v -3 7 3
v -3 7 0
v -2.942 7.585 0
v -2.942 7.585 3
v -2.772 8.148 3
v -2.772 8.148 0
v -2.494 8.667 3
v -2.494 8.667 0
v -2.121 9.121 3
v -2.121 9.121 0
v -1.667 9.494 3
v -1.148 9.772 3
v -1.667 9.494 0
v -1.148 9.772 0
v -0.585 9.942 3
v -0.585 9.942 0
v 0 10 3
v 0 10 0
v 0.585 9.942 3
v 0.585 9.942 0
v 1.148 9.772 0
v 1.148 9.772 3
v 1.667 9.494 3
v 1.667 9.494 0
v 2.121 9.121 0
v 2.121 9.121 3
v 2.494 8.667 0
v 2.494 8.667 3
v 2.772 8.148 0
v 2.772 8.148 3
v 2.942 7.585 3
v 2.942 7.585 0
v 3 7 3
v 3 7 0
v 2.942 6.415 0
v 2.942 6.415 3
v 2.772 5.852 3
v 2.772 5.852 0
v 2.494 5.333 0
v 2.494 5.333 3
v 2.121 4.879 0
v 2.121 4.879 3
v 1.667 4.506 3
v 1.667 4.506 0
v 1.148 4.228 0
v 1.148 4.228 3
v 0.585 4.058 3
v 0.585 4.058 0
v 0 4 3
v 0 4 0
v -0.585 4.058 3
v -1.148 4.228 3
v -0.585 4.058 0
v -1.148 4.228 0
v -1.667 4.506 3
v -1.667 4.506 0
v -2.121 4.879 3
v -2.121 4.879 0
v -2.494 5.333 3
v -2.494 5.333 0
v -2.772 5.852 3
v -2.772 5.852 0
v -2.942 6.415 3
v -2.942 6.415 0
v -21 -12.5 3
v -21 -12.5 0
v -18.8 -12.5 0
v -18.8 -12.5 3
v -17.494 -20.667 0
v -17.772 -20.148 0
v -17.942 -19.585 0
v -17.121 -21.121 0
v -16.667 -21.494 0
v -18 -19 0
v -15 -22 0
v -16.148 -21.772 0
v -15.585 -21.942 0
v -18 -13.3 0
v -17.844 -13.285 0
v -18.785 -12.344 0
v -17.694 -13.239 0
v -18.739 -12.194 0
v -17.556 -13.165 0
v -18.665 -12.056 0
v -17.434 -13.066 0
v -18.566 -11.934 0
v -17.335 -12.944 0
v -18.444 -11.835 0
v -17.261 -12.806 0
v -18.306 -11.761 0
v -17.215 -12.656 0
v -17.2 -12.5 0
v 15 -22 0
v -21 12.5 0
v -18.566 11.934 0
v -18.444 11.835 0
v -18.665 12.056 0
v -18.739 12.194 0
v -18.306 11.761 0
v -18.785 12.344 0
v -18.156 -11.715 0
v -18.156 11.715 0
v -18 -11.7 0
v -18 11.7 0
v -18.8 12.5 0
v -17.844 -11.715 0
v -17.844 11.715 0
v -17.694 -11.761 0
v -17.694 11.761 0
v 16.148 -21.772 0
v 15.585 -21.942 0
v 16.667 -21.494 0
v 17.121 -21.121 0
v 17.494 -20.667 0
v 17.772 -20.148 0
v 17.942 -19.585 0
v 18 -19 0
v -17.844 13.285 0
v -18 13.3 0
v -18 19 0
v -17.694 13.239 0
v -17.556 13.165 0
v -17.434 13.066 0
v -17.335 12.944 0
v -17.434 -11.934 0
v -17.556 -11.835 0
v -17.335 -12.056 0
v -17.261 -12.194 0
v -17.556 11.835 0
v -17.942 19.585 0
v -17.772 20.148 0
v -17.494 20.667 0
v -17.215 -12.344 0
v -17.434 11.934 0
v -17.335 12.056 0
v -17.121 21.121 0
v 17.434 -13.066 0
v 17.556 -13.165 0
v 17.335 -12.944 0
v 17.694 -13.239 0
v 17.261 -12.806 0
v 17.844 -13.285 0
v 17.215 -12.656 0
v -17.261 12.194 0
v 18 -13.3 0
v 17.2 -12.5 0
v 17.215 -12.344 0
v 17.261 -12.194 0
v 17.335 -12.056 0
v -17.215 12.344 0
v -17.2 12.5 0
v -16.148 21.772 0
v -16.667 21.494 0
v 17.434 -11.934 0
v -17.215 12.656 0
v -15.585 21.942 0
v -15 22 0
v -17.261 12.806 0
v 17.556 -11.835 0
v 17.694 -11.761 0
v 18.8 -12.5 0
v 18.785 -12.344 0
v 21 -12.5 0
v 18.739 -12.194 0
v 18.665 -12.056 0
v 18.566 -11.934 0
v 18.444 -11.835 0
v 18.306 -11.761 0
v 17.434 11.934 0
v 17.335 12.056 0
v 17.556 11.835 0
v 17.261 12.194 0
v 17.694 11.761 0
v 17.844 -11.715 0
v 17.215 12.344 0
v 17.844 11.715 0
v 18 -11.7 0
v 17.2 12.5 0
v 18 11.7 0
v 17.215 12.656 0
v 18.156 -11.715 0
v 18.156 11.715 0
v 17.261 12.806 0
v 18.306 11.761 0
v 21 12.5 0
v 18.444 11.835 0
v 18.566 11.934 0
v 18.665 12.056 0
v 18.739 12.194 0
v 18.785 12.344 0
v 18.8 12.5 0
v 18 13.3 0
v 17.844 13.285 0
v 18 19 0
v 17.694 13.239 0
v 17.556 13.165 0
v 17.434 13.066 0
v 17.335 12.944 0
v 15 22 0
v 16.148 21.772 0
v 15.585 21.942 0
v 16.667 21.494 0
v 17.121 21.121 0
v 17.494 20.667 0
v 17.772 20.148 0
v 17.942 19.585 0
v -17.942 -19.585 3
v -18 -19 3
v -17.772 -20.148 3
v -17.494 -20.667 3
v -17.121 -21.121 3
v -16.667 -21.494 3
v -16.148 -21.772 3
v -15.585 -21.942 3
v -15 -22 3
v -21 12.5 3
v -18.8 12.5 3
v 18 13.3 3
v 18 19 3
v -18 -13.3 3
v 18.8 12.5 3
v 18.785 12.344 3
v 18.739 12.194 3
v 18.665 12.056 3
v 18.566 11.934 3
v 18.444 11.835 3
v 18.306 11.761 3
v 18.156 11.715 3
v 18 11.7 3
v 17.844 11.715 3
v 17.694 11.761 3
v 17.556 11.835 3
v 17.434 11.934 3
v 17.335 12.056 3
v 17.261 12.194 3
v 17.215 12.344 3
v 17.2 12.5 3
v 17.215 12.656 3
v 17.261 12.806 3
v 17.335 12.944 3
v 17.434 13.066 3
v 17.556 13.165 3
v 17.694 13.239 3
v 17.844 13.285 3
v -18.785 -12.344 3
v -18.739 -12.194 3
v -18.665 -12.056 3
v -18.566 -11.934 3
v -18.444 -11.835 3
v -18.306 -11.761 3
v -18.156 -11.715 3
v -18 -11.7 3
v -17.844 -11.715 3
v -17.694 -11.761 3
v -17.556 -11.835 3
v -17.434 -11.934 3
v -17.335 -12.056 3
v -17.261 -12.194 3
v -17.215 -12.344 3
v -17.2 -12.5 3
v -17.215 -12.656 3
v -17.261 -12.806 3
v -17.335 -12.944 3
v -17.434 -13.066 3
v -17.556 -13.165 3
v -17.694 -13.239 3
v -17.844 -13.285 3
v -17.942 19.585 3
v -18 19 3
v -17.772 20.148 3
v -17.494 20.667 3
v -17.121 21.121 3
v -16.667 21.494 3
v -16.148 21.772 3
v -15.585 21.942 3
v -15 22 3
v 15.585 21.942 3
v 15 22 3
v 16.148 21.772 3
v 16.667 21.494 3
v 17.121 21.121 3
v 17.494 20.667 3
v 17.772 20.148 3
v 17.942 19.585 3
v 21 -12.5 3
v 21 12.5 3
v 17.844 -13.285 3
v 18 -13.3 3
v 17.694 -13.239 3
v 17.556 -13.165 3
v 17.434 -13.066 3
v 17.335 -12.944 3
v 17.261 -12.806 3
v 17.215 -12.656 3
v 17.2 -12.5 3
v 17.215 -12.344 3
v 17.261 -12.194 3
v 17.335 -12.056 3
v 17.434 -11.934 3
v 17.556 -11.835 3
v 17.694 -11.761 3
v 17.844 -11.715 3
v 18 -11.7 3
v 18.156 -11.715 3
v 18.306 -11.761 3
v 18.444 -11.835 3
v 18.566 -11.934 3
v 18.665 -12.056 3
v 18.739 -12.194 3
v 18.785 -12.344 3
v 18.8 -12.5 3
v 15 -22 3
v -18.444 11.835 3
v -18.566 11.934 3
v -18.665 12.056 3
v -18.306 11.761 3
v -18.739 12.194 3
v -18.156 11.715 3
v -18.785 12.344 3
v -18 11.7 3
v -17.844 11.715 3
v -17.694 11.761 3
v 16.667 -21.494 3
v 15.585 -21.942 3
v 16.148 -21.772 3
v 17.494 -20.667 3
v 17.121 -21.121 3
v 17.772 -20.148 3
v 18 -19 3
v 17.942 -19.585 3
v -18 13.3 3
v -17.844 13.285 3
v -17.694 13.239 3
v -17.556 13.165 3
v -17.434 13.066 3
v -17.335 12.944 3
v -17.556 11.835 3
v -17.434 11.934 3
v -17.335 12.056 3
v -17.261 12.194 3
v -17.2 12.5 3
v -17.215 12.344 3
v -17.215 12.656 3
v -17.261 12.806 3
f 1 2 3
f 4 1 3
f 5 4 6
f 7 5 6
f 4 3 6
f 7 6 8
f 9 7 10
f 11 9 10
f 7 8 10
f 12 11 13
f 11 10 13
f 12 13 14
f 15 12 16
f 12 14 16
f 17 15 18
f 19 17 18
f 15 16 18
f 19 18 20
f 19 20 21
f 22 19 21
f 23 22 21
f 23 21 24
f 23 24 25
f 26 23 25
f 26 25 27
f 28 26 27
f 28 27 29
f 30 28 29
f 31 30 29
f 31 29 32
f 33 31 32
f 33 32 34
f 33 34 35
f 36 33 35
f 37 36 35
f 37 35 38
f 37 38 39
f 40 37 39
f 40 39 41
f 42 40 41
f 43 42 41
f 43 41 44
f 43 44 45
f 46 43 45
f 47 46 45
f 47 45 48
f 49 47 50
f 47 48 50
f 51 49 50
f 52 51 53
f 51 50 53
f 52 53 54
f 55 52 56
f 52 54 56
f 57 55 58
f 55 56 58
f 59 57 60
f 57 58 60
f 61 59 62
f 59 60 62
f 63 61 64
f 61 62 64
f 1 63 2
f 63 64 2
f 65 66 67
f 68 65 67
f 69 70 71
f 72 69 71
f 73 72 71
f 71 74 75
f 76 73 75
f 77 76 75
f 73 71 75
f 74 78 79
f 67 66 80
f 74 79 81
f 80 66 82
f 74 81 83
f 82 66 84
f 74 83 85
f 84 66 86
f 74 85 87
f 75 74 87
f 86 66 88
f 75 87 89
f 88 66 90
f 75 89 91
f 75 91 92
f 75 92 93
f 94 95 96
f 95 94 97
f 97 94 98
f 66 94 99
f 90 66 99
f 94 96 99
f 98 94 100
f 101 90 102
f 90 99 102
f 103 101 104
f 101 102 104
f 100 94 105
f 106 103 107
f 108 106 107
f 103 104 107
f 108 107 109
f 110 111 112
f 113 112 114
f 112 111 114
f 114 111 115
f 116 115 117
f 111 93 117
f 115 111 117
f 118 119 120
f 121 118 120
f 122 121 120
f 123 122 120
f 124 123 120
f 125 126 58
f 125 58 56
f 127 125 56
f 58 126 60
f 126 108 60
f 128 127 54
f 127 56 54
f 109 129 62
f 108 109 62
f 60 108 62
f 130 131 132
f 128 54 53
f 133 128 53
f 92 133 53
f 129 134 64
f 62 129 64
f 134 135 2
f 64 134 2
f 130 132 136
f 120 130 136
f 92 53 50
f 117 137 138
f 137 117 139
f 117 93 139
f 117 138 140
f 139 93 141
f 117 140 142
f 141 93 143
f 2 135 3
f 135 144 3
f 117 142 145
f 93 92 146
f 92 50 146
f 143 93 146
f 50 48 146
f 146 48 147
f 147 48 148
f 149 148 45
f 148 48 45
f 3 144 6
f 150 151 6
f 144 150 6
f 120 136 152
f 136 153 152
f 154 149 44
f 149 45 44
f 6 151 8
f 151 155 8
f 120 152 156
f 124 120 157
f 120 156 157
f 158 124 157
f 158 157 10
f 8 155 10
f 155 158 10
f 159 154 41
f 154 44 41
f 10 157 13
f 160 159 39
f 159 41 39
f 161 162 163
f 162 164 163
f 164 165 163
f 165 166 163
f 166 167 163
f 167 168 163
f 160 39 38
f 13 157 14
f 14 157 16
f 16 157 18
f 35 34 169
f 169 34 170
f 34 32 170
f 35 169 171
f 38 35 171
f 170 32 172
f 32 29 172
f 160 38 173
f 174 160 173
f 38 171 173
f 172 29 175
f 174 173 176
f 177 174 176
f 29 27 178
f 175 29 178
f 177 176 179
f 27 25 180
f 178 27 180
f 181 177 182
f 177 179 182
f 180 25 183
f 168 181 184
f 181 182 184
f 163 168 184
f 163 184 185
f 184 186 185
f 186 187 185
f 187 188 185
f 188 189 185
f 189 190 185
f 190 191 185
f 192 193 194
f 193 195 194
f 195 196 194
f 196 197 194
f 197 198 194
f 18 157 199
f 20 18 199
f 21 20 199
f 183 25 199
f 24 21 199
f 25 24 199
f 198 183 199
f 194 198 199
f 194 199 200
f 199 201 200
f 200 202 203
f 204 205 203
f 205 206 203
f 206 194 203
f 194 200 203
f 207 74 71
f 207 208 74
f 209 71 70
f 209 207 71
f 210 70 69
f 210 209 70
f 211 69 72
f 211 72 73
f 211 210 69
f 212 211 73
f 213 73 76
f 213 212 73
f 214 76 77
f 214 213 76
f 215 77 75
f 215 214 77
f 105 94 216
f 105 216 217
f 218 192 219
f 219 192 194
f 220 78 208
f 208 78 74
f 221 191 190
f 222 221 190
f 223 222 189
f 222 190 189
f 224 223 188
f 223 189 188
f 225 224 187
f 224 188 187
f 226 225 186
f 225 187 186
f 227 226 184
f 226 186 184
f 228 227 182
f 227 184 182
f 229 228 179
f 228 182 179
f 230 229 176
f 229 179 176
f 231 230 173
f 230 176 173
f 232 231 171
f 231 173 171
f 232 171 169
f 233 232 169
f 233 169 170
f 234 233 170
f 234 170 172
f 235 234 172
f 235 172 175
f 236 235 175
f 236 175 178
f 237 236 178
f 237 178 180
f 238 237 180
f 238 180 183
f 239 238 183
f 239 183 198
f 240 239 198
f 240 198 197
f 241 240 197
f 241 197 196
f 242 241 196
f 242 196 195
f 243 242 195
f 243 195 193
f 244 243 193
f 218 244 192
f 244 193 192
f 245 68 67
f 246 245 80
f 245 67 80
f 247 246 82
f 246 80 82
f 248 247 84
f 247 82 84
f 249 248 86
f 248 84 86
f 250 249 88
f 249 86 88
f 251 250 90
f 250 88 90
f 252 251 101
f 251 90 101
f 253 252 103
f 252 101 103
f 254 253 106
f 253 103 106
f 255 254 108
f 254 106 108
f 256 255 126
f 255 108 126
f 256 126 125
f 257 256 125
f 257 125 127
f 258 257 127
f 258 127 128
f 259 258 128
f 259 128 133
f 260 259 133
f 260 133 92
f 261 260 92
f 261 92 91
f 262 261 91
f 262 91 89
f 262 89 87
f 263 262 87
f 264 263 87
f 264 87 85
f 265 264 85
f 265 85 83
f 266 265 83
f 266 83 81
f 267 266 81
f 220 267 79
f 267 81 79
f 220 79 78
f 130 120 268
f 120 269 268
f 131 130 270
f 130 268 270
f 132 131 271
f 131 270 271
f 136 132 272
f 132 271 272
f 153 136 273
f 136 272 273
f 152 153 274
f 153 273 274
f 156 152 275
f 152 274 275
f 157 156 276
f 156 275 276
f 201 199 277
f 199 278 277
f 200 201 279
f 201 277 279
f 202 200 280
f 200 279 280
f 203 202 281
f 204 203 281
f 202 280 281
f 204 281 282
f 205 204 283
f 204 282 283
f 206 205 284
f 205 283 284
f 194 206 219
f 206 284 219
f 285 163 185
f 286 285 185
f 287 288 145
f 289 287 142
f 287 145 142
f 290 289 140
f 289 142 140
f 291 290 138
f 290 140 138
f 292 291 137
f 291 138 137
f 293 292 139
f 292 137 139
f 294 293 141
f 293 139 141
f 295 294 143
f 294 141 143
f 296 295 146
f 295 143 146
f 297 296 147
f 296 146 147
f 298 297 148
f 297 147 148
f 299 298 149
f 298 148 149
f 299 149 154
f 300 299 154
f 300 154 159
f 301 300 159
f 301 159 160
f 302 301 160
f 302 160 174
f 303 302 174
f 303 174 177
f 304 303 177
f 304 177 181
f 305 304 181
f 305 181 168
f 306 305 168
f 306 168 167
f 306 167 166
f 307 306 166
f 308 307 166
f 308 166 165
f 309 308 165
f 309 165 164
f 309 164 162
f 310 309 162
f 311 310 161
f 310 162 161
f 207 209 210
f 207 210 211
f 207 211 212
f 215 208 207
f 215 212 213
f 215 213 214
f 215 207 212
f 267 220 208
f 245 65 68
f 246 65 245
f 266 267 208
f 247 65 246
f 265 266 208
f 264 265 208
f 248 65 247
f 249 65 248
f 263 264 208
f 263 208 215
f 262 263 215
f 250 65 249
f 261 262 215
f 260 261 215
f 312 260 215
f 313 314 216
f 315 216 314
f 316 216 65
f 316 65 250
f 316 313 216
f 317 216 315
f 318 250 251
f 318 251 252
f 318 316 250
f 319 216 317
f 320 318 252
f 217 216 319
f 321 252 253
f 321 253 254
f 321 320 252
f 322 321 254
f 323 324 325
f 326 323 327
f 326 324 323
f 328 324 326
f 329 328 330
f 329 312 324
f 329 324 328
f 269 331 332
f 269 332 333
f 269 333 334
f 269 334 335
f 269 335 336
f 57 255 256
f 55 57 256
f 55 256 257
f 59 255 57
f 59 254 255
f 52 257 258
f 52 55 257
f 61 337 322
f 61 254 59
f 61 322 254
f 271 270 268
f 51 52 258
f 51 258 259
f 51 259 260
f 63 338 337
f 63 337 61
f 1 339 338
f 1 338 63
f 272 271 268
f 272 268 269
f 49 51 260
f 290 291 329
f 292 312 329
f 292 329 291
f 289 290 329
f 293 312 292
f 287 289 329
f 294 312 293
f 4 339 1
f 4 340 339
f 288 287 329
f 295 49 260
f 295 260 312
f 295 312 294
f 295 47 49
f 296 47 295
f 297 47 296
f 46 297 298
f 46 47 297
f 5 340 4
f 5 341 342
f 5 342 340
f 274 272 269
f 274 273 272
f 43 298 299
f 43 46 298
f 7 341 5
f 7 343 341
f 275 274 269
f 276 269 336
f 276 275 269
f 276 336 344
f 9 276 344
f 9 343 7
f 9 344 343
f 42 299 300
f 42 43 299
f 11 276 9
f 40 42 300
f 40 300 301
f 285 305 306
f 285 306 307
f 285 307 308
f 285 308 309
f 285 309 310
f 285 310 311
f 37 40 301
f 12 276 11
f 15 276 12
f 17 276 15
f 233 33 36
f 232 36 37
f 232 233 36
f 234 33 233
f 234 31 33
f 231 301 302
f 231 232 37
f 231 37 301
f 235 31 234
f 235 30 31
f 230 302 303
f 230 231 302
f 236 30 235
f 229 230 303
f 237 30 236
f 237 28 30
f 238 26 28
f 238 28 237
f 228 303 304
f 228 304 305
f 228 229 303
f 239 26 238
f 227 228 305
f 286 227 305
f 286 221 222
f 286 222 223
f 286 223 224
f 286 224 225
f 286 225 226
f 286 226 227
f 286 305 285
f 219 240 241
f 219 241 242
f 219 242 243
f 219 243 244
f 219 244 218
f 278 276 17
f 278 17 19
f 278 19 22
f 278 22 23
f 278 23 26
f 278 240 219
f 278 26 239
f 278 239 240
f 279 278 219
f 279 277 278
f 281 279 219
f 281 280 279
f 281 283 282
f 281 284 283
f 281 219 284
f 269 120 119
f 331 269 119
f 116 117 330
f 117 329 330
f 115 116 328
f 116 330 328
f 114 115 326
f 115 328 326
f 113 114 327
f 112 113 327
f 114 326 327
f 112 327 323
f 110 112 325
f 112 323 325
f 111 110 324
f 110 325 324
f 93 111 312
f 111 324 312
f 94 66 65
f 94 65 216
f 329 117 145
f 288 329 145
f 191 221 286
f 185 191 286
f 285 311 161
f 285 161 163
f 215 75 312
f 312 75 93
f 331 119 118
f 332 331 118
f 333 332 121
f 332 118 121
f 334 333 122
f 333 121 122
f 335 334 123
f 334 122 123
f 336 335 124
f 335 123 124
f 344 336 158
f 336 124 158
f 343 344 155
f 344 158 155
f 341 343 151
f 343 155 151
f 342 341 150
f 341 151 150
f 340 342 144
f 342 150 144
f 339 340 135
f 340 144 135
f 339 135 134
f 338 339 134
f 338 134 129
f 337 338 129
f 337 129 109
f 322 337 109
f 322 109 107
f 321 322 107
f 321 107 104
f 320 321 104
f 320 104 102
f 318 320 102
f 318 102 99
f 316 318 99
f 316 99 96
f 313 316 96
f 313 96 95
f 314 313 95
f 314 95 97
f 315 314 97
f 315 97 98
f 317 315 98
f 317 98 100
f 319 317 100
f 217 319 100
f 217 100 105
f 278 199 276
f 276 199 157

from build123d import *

# Parameters (mm, degrees)
SKETCH1_W           = 3
SKETCH1_H           = 25
BOSS_EXTRUDE1_DEPTH = 3
SKETCH5_R           = 3
CUT_EXTRUDE3_DEPTH  = 31.56141358
SKETCH6_R           = 0.8
CUT_EXTRUDE4_DEPTH  = 31.56141358
FILLET1_R           = 3


with BuildPart() as part:
    # Sketch1 → Boss-Extrude1 (new body)
    with BuildSketch(Plane.XY):
        Polygon((-18, -12.5), (-18, -22), (18, -22), (18, -12.5), (15, -12.5), (15, 12.5), (18, 12.5), (18, 22), (-18, 22), (-18, 12.5), (-15, 12.5), (-15, -12.5), align=None)
        with Locations((-19.5, 0)):
            Rectangle(SKETCH1_W, SKETCH1_H)
        with Locations((-16.5, 0)):
            Rectangle(SKETCH1_W, SKETCH1_H)
        with Locations((19.5, 0)):
            Rectangle(SKETCH1_W, SKETCH1_H)
        with Locations((16.5, 0)):
            Rectangle(SKETCH1_W, SKETCH1_H)
    extrude(amount=BOSS_EXTRUDE1_DEPTH)

    # Sketch5 → Cut-Extrude3 (cut, through all)
    with BuildSketch(Plane(origin=(0, 0, 0), x_dir=(-1, 0, 0), z_dir=(0, 0, -1))):
        with Locations((0, 7)):
            Circle(SKETCH5_R)
    extrude(amount=-CUT_EXTRUDE3_DEPTH, mode=Mode.SUBTRACT)

    # Sketch6 → Cut-Extrude4 (cut, through all)
    with BuildSketch(Plane(origin=(0, 0, 0), x_dir=(-1, 0, 0), z_dir=(0, 0, -1))):
        with Locations((-18, 12.5)):
            Circle(SKETCH6_R)
        with Locations((-18, -12.5)):
            Circle(SKETCH6_R)
        with Locations((18, -12.5)):
            Circle(SKETCH6_R)
        with Locations((18, 12.5)):
            Circle(SKETCH6_R)
    extrude(amount=-CUT_EXTRUDE4_DEPTH, mode=Mode.SUBTRACT)

    # Fillet1
    fillet1_edges = [part.edges().sort_by_distance(p)[0] for p in [
        (-18, 22, 1.5),
        (18, 22, 1.5),
        (18, -22, 1.5),
        (-18, -22, 1.5),
    ]]
    fillet(fillet1_edges, radius=FILLET1_R)


solid = part.part
